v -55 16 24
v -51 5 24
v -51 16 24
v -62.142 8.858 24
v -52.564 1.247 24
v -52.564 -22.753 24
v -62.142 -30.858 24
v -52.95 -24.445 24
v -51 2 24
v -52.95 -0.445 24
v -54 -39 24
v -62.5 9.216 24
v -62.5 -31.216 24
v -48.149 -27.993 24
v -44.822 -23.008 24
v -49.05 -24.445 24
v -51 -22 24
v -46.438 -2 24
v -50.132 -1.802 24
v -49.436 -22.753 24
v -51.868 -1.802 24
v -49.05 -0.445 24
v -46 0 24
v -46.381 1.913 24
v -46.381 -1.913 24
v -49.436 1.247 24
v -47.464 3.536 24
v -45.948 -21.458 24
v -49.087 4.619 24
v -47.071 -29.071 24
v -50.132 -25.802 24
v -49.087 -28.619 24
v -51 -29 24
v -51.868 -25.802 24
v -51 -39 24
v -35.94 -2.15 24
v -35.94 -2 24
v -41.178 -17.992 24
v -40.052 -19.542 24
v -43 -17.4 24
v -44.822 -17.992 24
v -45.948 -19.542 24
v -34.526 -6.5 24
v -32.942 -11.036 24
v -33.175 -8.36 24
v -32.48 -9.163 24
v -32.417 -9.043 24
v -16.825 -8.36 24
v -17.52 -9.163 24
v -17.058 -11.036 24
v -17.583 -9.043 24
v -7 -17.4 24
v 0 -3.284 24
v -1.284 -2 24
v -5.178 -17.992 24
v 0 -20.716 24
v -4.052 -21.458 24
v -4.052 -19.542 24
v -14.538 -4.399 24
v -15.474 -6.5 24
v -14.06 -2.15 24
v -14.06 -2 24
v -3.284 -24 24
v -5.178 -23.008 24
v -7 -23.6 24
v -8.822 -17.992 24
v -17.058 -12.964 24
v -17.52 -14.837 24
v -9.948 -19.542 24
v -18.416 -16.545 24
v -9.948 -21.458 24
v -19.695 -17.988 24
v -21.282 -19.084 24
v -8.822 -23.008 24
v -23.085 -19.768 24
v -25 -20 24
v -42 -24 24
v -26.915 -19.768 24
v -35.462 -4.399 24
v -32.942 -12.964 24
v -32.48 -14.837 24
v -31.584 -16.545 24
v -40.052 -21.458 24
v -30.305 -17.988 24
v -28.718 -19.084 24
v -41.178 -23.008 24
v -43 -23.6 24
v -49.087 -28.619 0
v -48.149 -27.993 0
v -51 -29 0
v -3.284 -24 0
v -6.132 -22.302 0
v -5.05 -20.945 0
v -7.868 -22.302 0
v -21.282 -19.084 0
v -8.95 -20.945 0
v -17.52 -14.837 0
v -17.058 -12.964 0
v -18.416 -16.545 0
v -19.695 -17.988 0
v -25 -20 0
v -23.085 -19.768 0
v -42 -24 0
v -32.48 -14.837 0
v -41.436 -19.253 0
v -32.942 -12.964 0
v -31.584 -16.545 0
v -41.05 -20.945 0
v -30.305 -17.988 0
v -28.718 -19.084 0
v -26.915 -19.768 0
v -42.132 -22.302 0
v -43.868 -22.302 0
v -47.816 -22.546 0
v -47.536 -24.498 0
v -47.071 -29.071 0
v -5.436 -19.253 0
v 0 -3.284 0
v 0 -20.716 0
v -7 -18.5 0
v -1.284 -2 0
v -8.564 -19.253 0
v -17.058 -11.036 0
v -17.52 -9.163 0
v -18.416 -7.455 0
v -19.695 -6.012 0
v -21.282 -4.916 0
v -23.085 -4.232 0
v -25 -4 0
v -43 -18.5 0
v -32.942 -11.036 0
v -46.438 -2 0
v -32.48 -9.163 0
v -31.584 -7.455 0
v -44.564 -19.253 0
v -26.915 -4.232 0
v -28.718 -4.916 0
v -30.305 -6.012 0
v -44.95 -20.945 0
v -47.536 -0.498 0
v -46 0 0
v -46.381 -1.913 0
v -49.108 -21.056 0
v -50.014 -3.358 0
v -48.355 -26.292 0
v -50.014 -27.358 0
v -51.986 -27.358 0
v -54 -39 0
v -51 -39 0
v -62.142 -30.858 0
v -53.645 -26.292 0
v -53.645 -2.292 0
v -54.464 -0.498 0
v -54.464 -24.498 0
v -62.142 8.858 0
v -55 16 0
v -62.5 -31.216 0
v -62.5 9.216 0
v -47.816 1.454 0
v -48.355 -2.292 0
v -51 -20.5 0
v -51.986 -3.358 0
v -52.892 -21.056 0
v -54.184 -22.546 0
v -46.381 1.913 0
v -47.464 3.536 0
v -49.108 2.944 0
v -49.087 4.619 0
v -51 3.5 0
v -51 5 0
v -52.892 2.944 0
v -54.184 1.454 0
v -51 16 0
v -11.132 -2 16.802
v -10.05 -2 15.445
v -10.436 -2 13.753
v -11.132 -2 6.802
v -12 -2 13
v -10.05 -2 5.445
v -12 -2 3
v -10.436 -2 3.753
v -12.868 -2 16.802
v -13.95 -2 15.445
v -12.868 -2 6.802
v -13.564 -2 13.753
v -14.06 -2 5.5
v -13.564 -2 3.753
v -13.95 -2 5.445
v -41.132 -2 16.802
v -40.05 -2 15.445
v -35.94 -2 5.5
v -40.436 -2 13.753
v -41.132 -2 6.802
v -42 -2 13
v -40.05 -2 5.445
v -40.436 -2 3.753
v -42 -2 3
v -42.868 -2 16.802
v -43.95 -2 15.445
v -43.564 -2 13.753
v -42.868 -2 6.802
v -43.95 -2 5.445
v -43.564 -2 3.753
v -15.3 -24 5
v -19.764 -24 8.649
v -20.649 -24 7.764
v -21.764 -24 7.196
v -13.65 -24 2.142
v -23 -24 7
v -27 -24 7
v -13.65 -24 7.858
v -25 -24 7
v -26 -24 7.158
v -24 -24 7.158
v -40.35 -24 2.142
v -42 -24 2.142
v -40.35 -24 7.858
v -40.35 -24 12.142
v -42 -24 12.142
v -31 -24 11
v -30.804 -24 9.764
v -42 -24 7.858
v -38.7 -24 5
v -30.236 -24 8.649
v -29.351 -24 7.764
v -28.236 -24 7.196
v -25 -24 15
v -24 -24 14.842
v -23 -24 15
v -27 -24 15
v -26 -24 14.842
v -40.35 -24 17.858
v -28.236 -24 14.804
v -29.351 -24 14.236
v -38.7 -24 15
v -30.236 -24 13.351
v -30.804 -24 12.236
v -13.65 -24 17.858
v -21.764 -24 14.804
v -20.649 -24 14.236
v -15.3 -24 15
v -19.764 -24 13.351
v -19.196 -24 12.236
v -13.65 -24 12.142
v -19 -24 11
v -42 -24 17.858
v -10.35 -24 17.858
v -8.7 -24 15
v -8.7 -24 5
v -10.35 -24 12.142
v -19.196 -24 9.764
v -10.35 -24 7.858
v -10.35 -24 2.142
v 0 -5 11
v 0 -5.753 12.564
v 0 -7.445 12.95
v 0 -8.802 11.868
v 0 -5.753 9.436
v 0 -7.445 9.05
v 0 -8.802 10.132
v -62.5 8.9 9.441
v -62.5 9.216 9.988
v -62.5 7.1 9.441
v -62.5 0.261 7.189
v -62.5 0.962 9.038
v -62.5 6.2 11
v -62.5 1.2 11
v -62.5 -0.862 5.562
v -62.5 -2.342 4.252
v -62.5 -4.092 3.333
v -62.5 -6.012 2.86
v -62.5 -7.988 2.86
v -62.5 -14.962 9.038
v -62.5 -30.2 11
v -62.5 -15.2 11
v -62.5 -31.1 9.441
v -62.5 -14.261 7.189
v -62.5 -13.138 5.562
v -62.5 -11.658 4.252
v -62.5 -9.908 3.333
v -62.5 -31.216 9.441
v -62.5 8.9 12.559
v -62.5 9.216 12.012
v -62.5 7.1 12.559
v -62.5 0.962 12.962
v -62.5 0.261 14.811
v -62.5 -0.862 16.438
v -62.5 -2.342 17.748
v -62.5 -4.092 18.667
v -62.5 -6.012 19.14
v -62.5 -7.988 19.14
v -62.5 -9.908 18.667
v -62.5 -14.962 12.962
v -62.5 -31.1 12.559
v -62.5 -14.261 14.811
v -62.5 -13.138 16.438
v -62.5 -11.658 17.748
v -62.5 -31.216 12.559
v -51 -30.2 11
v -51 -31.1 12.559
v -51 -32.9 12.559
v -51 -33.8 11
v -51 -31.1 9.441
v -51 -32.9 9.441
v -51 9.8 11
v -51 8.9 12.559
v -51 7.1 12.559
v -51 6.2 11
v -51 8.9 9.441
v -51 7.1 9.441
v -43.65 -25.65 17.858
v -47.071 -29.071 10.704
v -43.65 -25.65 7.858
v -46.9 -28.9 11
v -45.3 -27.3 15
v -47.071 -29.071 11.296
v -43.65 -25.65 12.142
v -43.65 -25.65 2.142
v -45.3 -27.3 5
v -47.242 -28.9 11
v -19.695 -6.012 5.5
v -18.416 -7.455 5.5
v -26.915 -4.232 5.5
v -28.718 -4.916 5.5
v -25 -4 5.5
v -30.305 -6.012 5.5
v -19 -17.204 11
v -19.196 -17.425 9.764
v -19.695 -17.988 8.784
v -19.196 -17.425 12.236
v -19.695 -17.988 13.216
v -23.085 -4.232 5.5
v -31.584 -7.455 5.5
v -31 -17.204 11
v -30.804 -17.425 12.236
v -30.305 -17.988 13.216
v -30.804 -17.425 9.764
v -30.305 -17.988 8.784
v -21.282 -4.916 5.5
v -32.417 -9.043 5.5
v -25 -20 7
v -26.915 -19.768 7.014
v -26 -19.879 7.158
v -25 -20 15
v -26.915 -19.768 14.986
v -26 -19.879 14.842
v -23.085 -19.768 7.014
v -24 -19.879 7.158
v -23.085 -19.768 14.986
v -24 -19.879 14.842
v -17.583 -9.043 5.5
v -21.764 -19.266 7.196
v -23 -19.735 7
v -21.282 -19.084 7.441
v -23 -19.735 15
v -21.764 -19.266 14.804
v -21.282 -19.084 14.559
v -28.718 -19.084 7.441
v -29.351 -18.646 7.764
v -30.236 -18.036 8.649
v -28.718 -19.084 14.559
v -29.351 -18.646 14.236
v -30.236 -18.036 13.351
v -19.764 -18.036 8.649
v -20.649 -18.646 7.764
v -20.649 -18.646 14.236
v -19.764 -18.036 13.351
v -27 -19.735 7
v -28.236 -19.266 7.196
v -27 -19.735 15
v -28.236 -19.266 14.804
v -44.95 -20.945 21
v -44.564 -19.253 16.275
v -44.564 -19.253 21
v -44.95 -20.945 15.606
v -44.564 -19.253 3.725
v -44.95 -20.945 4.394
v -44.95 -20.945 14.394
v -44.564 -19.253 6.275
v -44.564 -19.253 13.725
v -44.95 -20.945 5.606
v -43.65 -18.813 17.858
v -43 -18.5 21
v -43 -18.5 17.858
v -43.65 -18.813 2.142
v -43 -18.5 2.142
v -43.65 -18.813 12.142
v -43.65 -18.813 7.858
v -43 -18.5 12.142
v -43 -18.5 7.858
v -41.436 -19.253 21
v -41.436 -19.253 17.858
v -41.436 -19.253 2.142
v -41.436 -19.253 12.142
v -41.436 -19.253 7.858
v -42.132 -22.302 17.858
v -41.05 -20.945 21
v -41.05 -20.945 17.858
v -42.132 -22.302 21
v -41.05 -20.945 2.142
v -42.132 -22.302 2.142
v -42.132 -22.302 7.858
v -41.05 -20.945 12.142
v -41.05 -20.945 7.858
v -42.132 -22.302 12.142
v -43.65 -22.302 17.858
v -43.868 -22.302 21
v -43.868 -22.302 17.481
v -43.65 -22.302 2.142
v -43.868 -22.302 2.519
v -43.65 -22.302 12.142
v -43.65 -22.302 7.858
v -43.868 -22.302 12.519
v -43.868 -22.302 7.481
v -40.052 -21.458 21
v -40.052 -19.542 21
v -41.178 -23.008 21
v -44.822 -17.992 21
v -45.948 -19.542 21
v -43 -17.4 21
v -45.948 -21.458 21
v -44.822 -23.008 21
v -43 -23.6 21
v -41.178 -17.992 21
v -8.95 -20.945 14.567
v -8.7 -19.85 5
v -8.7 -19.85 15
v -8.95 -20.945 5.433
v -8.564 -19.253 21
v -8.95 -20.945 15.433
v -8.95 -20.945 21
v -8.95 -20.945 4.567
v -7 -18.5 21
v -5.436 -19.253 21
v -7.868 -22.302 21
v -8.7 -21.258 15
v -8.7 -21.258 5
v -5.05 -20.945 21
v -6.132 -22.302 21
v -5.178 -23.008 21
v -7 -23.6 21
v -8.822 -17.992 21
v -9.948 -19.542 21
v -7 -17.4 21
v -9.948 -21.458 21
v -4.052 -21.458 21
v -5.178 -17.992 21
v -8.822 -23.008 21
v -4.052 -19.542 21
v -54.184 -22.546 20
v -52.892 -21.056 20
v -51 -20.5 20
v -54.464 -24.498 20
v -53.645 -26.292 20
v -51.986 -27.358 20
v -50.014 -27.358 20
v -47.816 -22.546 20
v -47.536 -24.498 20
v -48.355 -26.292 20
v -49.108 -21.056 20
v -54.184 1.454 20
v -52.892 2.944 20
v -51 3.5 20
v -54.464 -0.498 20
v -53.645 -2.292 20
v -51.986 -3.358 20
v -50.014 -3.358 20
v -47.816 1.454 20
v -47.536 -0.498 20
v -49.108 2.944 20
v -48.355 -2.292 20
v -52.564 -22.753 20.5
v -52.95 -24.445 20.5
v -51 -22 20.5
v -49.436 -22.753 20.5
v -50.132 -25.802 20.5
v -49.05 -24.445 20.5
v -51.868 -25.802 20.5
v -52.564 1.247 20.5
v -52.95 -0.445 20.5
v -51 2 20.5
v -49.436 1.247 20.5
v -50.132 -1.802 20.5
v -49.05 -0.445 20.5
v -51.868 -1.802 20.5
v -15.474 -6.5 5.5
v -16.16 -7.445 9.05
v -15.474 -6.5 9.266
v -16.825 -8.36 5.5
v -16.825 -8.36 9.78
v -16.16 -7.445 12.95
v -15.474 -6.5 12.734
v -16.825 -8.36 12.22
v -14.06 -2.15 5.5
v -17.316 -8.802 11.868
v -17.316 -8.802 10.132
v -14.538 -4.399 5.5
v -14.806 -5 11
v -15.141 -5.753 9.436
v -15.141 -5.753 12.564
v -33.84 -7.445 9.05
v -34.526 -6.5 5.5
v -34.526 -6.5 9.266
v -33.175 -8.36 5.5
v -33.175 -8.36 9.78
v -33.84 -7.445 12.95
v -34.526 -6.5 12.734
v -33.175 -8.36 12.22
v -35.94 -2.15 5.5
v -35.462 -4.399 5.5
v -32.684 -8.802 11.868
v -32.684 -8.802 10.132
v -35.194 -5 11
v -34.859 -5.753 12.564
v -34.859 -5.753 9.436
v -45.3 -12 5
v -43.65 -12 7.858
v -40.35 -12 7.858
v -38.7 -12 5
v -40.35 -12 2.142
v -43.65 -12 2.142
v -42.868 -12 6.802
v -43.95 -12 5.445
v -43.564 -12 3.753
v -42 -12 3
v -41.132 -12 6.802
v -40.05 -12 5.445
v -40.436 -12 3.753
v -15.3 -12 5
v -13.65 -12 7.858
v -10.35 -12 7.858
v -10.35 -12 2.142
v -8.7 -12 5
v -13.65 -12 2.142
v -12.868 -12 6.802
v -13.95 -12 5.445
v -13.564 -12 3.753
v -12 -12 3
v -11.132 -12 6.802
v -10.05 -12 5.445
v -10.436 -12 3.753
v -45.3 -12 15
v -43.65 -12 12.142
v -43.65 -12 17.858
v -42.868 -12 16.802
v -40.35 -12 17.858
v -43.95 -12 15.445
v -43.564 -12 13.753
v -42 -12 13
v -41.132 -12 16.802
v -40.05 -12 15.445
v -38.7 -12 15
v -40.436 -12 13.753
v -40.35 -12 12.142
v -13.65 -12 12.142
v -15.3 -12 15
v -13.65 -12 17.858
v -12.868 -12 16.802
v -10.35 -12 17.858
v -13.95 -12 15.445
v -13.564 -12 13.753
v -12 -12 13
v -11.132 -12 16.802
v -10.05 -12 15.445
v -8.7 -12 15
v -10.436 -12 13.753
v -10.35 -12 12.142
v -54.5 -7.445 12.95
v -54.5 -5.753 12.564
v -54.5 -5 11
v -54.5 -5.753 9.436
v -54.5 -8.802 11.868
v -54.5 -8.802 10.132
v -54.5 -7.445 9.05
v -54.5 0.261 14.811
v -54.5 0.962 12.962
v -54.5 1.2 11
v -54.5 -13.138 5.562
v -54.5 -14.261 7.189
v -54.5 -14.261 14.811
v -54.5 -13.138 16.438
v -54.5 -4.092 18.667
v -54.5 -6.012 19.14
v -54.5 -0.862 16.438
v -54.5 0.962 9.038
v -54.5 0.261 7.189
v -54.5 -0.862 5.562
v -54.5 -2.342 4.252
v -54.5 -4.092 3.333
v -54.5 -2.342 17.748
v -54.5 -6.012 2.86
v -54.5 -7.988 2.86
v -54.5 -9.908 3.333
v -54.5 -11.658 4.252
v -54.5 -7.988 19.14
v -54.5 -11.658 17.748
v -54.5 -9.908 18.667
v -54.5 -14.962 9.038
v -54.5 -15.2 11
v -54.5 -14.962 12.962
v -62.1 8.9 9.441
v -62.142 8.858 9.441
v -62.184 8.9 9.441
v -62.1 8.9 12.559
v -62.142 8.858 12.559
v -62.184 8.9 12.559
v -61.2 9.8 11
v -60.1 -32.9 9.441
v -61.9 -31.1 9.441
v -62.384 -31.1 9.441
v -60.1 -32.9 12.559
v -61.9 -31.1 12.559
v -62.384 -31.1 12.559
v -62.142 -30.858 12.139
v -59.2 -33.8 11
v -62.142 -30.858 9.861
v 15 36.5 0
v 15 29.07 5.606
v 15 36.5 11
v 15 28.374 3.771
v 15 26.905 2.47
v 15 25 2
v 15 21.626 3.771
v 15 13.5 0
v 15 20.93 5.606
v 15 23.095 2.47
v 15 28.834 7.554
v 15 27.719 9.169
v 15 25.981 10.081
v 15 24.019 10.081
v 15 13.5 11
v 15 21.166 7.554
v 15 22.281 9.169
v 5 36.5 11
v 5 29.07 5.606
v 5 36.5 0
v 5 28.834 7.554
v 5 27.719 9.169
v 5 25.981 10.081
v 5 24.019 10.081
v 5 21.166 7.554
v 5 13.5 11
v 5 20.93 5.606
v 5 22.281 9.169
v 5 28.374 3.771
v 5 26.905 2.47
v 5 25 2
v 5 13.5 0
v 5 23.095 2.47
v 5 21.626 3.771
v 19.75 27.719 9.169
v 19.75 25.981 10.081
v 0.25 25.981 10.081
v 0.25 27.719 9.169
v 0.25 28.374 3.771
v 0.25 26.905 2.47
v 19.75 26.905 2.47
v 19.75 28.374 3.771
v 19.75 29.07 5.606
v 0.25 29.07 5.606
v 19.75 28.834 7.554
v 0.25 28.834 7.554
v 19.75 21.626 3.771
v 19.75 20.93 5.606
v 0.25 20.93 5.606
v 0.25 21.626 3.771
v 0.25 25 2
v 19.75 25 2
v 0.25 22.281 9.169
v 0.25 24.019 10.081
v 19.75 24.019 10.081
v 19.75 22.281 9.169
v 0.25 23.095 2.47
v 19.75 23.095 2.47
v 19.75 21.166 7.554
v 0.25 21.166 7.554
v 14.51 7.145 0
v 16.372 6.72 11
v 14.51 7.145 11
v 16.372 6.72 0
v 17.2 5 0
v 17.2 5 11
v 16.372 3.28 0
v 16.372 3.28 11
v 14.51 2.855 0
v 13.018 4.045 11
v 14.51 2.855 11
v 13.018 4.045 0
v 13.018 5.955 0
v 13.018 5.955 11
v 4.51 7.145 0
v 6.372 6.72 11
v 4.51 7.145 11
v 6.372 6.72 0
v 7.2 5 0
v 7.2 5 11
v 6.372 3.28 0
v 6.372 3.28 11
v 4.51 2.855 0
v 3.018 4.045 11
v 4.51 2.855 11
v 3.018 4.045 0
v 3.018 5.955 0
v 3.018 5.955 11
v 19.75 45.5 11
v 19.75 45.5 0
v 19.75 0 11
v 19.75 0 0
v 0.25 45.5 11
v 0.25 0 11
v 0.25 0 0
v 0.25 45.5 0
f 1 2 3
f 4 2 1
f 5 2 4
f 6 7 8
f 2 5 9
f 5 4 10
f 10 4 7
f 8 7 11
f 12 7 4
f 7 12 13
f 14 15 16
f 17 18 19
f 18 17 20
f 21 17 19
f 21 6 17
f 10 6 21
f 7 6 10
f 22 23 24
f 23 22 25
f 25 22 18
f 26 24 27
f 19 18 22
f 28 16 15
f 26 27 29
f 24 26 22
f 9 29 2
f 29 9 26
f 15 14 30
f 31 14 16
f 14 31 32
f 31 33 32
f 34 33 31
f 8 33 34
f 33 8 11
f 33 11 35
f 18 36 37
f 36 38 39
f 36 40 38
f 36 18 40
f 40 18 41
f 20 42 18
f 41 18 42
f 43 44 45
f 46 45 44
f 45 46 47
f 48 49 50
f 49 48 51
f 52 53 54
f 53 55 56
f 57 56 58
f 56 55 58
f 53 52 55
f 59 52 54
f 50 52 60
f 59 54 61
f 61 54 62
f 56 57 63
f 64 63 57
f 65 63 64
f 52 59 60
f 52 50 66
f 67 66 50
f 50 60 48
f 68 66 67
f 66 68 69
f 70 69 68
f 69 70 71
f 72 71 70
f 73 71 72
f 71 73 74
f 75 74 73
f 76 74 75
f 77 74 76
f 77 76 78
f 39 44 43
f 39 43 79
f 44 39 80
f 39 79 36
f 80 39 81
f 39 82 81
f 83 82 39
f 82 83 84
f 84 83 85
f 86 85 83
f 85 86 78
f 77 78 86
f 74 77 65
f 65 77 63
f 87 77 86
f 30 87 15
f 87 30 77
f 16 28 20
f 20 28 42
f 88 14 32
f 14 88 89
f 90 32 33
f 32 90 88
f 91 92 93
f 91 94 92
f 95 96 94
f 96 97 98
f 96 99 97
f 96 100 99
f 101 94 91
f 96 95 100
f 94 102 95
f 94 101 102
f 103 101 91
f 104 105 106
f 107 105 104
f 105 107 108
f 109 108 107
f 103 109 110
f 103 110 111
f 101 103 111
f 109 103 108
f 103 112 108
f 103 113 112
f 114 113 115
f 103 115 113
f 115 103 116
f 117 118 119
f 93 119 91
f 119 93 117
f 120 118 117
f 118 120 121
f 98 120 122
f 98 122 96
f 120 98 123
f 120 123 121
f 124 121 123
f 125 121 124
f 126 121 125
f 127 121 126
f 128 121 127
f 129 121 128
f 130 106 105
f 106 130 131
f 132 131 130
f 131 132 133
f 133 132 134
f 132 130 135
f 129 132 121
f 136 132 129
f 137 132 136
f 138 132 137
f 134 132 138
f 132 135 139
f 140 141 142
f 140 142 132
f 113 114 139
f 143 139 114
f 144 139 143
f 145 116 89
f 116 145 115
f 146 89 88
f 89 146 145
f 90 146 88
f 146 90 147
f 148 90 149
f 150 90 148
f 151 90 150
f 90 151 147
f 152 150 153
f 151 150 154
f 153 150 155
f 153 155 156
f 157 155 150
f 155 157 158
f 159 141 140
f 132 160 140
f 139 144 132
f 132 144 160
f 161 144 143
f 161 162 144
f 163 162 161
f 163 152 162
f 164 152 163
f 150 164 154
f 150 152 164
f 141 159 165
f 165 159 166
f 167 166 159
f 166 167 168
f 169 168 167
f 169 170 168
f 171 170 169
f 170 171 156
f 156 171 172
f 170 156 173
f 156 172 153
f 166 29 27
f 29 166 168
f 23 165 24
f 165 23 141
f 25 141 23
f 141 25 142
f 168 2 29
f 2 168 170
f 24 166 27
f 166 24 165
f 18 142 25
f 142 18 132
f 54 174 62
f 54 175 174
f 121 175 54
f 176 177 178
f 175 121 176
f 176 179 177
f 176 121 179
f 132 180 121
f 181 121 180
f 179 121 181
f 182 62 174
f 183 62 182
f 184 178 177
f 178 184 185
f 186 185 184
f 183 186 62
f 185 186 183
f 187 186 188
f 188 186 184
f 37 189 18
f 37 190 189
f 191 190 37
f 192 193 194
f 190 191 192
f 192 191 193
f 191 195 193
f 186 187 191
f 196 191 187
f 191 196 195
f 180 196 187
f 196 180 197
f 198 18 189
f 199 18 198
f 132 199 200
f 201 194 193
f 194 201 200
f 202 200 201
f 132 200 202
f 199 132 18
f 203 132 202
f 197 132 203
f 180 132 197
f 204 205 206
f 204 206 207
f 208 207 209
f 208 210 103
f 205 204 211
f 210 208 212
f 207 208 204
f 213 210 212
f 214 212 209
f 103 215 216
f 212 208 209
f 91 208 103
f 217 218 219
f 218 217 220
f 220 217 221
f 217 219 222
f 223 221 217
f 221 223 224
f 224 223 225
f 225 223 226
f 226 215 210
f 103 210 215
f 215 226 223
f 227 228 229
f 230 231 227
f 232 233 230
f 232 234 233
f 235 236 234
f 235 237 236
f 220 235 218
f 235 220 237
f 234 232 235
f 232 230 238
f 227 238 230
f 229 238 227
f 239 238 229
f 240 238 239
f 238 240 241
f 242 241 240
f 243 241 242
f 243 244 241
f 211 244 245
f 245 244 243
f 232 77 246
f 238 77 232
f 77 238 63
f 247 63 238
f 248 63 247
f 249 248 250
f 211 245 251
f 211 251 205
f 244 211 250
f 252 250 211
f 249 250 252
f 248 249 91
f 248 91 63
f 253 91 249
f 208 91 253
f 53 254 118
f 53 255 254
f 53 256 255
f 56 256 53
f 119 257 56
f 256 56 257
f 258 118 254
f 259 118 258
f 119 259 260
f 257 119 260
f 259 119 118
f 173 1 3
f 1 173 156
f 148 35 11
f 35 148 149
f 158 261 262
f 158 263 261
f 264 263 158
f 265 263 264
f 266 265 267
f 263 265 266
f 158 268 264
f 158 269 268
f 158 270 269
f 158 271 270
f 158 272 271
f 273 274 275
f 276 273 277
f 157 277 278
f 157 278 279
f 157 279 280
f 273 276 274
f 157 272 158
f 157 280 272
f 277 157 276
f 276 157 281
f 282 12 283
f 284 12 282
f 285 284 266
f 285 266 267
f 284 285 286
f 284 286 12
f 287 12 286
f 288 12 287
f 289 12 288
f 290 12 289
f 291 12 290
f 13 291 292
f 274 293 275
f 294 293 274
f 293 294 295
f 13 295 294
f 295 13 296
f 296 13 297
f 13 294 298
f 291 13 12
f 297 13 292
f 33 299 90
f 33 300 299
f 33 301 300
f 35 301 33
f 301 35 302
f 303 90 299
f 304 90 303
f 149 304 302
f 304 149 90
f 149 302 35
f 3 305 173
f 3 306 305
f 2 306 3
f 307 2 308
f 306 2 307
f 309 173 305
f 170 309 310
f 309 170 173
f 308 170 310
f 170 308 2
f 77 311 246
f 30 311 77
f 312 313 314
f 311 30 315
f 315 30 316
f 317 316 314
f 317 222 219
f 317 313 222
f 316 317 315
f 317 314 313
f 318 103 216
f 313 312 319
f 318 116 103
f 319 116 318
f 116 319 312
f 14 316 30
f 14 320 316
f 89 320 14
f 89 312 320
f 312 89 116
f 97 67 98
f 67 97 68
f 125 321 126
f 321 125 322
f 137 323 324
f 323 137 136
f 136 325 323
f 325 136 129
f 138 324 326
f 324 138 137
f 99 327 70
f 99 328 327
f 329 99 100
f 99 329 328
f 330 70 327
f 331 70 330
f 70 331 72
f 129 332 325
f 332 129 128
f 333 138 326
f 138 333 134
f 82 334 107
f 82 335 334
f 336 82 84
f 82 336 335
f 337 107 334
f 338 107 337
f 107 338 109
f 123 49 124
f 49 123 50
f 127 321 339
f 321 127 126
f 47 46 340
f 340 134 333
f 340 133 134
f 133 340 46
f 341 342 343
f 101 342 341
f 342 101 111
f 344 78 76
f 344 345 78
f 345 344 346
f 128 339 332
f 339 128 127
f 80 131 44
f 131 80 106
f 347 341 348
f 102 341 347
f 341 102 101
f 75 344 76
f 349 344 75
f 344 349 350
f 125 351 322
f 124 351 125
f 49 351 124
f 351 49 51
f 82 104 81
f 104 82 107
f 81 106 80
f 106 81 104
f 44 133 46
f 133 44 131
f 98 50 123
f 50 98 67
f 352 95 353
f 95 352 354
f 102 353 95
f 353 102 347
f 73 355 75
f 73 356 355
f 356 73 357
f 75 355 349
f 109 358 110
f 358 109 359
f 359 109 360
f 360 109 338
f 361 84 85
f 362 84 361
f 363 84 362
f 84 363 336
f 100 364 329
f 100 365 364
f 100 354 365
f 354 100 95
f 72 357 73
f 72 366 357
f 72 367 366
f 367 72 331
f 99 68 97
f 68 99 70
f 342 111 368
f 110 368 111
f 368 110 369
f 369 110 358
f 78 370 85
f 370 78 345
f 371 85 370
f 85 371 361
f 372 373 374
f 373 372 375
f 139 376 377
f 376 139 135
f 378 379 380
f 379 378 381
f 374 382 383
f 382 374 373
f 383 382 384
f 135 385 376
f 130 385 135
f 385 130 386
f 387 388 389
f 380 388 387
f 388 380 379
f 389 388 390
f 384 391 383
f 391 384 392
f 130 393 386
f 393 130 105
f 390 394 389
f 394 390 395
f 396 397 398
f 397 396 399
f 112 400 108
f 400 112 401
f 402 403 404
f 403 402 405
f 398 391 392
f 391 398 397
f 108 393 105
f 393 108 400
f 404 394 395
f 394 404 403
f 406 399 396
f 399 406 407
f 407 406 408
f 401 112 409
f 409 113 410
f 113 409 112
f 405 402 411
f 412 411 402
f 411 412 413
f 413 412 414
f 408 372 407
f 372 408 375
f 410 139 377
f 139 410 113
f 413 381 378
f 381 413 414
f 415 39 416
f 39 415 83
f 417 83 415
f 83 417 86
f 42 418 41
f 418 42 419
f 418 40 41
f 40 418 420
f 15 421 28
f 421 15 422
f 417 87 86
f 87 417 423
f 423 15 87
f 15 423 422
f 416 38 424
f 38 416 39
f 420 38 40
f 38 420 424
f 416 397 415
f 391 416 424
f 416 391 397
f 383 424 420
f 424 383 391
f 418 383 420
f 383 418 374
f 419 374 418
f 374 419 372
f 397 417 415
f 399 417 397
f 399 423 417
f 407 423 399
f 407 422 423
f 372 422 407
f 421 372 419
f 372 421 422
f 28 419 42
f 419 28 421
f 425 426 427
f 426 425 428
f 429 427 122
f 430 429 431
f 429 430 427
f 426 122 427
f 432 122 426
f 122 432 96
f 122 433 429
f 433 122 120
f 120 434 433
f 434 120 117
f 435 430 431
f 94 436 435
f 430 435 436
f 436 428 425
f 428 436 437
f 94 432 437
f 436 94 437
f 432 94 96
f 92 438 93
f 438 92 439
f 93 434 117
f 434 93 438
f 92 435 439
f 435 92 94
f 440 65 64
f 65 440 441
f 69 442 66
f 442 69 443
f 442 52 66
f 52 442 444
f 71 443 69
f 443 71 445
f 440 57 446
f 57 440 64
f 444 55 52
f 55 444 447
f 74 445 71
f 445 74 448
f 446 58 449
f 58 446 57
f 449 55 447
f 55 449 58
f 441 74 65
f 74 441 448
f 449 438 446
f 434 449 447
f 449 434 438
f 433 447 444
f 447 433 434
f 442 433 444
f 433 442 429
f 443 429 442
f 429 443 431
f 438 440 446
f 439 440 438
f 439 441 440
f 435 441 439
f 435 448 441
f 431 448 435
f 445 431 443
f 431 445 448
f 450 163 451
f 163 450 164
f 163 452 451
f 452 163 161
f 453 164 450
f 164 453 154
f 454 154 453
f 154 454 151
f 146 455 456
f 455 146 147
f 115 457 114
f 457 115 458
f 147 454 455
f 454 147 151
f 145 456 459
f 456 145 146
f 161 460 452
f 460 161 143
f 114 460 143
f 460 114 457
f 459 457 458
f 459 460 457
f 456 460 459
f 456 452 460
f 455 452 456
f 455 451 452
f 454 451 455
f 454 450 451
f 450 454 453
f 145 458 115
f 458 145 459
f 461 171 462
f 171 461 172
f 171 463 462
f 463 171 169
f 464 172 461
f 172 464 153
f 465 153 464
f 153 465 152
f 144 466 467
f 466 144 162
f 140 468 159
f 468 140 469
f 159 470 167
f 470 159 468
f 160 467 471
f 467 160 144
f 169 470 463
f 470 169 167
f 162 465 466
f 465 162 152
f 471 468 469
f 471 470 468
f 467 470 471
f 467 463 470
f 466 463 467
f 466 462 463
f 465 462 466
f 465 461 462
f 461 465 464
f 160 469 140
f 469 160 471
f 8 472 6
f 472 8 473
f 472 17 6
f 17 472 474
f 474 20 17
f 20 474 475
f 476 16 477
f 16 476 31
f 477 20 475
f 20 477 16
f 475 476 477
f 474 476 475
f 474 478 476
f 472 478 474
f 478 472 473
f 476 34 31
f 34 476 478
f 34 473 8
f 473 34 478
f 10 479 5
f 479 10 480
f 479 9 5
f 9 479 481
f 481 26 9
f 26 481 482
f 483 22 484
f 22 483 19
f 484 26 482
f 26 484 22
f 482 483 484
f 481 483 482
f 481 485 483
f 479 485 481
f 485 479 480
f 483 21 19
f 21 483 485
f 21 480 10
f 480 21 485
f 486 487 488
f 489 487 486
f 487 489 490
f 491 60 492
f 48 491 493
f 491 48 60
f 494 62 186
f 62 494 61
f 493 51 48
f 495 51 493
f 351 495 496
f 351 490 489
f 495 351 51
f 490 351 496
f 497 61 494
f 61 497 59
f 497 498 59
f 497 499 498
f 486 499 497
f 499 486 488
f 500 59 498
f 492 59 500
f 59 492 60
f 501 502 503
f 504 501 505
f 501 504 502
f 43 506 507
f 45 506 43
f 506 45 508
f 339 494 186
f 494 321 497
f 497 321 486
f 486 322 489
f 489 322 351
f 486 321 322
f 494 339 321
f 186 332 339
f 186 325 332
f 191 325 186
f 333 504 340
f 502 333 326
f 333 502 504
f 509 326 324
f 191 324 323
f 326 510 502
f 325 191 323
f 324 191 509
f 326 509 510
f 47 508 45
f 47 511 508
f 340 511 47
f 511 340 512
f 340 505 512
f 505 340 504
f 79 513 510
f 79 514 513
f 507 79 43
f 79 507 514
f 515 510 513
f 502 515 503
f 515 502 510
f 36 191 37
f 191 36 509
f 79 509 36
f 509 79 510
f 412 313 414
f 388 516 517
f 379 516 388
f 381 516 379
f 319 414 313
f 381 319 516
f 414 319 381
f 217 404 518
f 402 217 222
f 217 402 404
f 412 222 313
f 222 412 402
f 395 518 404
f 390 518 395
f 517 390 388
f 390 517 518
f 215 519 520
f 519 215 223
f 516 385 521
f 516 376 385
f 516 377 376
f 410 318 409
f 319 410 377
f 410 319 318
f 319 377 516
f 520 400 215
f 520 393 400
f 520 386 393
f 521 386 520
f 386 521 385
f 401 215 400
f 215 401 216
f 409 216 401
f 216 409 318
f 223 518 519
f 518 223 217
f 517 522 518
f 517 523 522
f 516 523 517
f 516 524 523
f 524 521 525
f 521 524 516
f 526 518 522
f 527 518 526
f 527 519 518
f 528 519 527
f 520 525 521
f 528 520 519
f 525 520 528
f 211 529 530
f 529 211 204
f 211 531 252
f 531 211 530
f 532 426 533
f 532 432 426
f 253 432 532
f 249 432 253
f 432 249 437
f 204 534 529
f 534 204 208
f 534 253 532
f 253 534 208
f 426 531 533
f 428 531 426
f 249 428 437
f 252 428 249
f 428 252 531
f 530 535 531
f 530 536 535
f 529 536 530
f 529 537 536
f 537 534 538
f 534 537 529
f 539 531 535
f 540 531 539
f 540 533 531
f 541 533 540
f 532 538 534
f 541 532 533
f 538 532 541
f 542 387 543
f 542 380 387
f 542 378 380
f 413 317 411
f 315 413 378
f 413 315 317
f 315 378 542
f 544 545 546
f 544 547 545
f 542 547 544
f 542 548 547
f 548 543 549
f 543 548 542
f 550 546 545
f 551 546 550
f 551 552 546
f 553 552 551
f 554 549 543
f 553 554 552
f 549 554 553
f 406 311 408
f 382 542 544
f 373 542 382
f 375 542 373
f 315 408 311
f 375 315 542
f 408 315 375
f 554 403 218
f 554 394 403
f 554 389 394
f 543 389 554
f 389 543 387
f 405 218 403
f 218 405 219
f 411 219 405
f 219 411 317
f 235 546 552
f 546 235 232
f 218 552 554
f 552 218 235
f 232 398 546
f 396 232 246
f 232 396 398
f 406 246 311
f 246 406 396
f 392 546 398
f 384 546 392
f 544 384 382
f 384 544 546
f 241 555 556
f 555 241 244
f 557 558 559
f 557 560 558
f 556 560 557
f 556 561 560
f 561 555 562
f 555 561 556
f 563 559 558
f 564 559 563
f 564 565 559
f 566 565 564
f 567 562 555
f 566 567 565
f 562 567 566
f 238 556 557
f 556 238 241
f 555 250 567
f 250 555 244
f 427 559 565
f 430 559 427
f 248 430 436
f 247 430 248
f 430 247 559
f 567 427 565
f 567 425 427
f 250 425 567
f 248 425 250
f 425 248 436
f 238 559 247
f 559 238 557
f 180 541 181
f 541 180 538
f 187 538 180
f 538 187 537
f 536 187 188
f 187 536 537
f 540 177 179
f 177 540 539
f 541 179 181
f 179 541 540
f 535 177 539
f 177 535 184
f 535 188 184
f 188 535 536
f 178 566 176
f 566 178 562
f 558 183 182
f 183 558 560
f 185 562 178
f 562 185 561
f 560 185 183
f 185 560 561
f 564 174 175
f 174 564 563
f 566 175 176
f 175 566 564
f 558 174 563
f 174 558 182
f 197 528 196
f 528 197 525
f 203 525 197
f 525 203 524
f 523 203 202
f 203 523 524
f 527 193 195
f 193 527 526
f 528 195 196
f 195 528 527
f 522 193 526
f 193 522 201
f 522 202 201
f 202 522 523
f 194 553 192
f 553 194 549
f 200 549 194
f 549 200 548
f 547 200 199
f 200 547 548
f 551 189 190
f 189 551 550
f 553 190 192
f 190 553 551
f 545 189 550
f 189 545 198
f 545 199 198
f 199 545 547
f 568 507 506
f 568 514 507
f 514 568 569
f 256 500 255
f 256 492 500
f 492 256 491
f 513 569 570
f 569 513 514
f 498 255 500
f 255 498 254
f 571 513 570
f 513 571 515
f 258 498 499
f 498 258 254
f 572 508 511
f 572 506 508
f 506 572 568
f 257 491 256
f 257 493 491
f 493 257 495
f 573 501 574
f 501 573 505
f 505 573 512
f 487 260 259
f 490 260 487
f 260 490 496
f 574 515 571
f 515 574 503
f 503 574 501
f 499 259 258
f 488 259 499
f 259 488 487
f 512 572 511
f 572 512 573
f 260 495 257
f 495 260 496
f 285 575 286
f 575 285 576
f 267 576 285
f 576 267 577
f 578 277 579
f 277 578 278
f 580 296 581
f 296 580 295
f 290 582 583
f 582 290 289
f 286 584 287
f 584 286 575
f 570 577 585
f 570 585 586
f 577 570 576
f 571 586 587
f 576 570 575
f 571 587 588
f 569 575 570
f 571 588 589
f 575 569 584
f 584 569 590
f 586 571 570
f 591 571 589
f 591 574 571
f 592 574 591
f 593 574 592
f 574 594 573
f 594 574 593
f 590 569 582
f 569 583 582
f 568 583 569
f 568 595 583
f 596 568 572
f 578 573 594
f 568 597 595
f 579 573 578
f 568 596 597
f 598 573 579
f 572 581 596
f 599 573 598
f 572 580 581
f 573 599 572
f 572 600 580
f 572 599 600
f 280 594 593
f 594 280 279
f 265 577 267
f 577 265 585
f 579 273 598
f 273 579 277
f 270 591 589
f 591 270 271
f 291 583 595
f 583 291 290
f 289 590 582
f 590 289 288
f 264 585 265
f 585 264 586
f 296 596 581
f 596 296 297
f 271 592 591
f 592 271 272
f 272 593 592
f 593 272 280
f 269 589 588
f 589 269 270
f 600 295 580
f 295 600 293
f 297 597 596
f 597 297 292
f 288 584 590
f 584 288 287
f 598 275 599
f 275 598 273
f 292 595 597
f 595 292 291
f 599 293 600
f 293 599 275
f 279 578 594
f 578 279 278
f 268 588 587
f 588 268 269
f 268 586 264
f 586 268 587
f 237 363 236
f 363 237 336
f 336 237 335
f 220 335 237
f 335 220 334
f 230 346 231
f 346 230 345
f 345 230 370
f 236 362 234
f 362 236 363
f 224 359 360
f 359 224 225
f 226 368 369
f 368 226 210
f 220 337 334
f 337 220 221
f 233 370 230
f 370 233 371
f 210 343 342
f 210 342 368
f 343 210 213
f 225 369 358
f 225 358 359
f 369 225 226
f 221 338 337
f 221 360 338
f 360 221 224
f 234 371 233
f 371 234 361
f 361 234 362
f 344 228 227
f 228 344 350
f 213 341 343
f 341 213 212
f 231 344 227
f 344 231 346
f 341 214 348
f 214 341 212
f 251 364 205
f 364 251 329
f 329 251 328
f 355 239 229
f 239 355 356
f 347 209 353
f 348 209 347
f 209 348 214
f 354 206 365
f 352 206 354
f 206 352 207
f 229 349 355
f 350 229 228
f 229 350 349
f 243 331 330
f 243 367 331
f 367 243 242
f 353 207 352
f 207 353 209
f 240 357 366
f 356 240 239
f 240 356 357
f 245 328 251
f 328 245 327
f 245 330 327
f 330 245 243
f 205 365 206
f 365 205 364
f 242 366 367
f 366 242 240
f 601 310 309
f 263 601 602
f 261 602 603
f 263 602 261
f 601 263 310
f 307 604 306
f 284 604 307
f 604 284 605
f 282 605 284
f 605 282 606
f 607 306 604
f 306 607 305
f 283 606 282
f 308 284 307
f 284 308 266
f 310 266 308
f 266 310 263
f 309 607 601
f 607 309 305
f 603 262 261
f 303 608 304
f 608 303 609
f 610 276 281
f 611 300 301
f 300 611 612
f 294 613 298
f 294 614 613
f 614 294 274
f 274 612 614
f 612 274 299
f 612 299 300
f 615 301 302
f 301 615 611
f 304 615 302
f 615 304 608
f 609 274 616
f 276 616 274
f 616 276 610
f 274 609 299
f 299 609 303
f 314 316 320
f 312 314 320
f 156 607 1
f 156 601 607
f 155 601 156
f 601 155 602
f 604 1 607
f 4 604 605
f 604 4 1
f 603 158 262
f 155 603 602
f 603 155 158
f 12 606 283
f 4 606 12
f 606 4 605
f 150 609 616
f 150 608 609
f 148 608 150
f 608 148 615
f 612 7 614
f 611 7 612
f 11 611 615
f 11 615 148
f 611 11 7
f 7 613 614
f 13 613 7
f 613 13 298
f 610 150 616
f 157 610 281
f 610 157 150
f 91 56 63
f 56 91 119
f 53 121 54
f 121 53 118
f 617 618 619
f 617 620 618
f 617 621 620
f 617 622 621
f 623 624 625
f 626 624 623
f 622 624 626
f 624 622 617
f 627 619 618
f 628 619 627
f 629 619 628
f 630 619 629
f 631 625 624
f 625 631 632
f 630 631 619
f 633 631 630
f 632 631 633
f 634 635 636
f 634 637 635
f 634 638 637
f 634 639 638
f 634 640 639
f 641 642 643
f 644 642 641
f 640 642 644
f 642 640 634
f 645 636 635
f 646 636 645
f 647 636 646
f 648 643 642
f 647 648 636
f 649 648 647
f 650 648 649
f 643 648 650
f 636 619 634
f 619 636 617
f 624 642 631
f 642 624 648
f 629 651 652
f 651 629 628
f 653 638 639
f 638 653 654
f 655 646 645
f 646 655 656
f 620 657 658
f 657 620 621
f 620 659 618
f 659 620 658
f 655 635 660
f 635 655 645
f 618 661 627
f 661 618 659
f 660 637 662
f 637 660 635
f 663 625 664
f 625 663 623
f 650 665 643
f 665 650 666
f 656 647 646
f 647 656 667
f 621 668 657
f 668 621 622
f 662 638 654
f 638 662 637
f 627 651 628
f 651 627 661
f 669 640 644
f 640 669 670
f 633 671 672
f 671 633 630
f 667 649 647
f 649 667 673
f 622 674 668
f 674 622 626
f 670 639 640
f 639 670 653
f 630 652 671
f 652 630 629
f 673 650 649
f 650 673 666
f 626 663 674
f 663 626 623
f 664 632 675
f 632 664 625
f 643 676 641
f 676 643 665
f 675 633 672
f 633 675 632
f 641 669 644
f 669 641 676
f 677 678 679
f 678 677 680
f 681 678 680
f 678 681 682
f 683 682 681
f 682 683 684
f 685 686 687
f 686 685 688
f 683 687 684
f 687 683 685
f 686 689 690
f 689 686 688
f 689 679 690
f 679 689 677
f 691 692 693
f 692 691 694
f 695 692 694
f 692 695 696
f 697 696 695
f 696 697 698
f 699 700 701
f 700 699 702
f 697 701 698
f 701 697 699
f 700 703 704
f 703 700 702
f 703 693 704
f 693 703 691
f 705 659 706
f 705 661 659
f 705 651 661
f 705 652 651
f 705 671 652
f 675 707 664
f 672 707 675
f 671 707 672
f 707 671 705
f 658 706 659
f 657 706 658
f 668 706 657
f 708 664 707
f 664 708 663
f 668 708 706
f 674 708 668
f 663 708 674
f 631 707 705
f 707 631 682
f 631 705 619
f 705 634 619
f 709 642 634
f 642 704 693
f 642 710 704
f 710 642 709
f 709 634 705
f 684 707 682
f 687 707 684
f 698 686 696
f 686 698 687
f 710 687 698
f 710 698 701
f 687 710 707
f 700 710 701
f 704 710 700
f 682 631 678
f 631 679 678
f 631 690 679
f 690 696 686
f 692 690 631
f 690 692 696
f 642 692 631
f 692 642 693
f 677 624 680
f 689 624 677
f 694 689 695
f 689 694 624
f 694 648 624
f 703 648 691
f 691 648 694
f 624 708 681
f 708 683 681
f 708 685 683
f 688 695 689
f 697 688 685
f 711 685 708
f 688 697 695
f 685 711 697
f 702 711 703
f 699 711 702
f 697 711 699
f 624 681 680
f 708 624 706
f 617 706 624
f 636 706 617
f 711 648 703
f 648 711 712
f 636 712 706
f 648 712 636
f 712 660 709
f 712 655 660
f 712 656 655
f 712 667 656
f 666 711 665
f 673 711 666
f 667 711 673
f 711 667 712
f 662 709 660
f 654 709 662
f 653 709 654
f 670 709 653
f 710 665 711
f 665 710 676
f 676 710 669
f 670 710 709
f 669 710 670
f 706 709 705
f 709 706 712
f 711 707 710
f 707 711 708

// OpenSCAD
// file: configuration.scad
x_rod_distance = 45;

// Select your belt type ******************************************************

//T2.5
//belt_tooth_distance = 2.032;
//belt_tooth_ratio = 0.5;

//T5 (strongly discouraged)
//belt_tooth_distance = 5;
//belt_tooth_ratio = 0.75;

//HTD3
//belt_tooth_distance = 3;
//belt_tooth_ratio = 0.75;

//MXL
belt_tooth_distance = 2.032;
belt_tooth_ratio = 0.64;

// Select your hot-end mount ******************************************************

// 0 = none; 1 = groove-mount (J-head/MakerGear etc.)
hotend_mount = 1;

hotend_groovemount_depth = 10;
hotend_groovemount_diameter = 16;
// main file
// not to be used with PG35L motor
// modified by misan

// PRUSA iteration3
// Compact extruder
// GNU GPL v3
// Josef Průša <iam@josefprusa.cz> and contributors
// http://www.reprap.org/wiki/Prusa_Mendel
// http://prusamendel.org

include <configuration.scad>

hotend_groovemount_depth = 8;
hotend_groovemount_diameter = 16.4;

module motor_dummy(){
  translate([-22,-22,-5]) %cube([44,44,5]);
	translate([18,18,-5]) %cylinder(r=2, h=24);
	translate([18,-18,-5]) %cylinder(r=2, h=24);
	translate([-18,18,-5]) %cylinder(r=2, h=24);
	translate([-18,-18,-5]) %cylinder(r=2, h=24);
	translate([-22+2.5+10,0,-5]) %cylinder(r=2.5, h=7);
	
}

module extruder_base(){
 // Main body
 translate([-1,-2,0]) cube([22,56,24]);
 // Extruder plate mount
 if (hotend_mount == 1) { // groove-mount
  translate([-16,49,0]) cube([55,5 + hotend_groovemount_depth - 1.5,24]);
 } else {
  translate([-16,49,0]) cube([55,5,24]);
 }
 
 // Carriage mount cylinders
 translate([11,25,0]){
  translate([-12,24,0]) cylinder(r=5, h=24);
  translate([12,24,0]) cylinder(r=5, h=24);
 }

 // Smoother join
 translate([1,38,0]) rotate([0,0,45])  cube([10,10,24]);
}

module extruder_holes(){
 translate([11,25,0]){ // Translate to center of the main block
  // Main shaft opening
  translate([0,-2,-1]) cylinder(r=8, h=26);

  // Lower motor mount hole
  translate([-8.5,18-2,-1]) cylinder(r=2, h=35);
  translate([-8.5,18-2,21]) cylinder(r=3.1, h=35);
  // Upper motor mount hole
  translate([-8.5,-18-2,-1]) cylinder(r=2, h=35);
  translate([-8.5,-18-2,21]) cylinder(r=3.1, h=35);
  // Idler motor mount hole
  translate([-8.5+36,18-2,-1]) cylinder(r=2, h=35);
  translate([-8.5+36,18-2,21]) cylinder(r=3.1, h=35);

  // Carriage mount right screw head hole
  translate([-12,24,-3]) cylinder(r=3.5, h=23);
  // Carriage mount left screw head hole
  translate([12,24,-3]) cylinder(r=3.5, h=23);
  // Carriage mount right screw hole
  translate([-12,24,20.5]) cylinder(r=2, h=23);
  // Carriage mount left screw head hole
  translate([12,24,20.5]) cylinder(r=2, h=23);
  // Idler bearing cutout
  translate([11,0-2,-4.5+10]) cylinder(r=11, h=20);
 }
 // Filament path
 translate([1.5+11+3.5,65,11]) rotate([90,0,0]) cylinder(r=2, h=70);
 if (hotend_mount == 1) {
  // Hole for hotend
  translate([1.5+11+3.5,65,11]) rotate([90,0,0]) cylinder(r=hotend_groovemount_diameter/2, h=12.5);
 }
 // Hole for drive gear check
 translate([1.5+11+3.5-30,25,11]) rotate([90,0,90]) cylinder(r=4, h=70, $fn=20);
 translate([1.5+11+3.5-30,23,11]) rotate([90,0,90]) cylinder(r=4, h=70, $fn=20);
 translate([1.5+11+3.5-30,21,11]) rotate([90,0,90]) cylinder(r=4, h=70, $fn=20);

 // Left extruder plate mounting hole
 translate([1.5+11+3.5+15,65,11]) rotate([90,0,0]) cylinder(r=1.8, h=70);
 translate([1.5+11+3.5+15,47,11]) rotate([90,0,0]) cylinder(r=3.1, h=70, $fn=6);
 // Right extruder plate mounting hole
 translate([1.5+11+3.5-25,65,11]) rotate([90,0,0]) cylinder(r=1.8, h=70);
 translate([1.5+11+3.5-25,47,11]) rotate([90,0,0]) cylinder(r=3.1, h=70, $fn=6);

  // Idler mounting holse
  translate([11,25,10]){
   // Nut traps
   translate([-30,15,-5]) rotate([0,90,0]) rotate([0,0,30]) cylinder(r=3.3, h=30, $fn=6);
   translate([-30,-15,-5]) rotate([0,90,0]) rotate([0,0,30]) cylinder(r=3.3, h=30, $fn=6);
   translate([-30,15,5]) rotate([0,90,0]) rotate([0,0,30]) cylinder(r=3.3, h=30, $fn=6);
   translate([-30,-15,5]) rotate([0,90,0]) rotate([0,0,30]) cylinder(r=3.3, h=30, $fn=6);
   // Screws
   translate([-30,-15,-5]) rotate([0,90,0]) cylinder(r=2, h=70);
   translate([-30,-15,5]) rotate([0,90,0]) cylinder(r=2, h=70);
   translate([-30, 15,-5]) rotate([0,90,0]) cylinder(r=2, h=70);
   translate([-30, 15,5]) rotate([0,90,0]) cylinder(r=2, h=70);
	}

 translate([46,46,-1]) rotate([0,0,45]) cube([20,20,26]);
 translate([46,13,-1]) rotate([0,0,45]) cube([20,20,26]);
 translate([-22,46,-1]) rotate([0,0,45]) cube([20,20,26]);
 translate([-22,24,-1]) rotate([0,0,45]) cube([20,20,26]);
 translate([-8,-20,-1]) rotate([0,0,45]) cube([20,20,26]);
 translate([30,-20,-1]) rotate([0,0,45]) cube([20,20,26]);
}

module extruder_idler_base(){
 translate([0.25,0,0]) cube([19.5,45.5,8+3]);
	
}

module extruder_idler_holes(){
 translate([10,25,0]){
  // Main cutout
  cube([10,23,25], center= true);
  // Idler shaft
  translate([-12,0,4.1+2])rotate([0,90,0])cylinder(r=4.1, h=24);
  // Screw holes
  translate([5,-20,-1])cylinder(r=2.2, h=24);
  translate([-5,-20,-1])cylinder(r=2.2, h=24);
 }
}


// Idler final part
module idler(){
 difference(){
  extruder_idler_base();
  extruder_idler_holes();
 }
}

//translate([10,0,1]) rotate([0,-90,0]) idler();
//translate([-47,-2,0])  idler();
// Extruder final part
module extruder(){
 translate([-23,2,0])difference(){
  extruder_base();
  extruder_holes();
 }
}

rotate ([0,0,90]) extruder();
translate([-2.5,25,0]) motor_dummy();
idler();
